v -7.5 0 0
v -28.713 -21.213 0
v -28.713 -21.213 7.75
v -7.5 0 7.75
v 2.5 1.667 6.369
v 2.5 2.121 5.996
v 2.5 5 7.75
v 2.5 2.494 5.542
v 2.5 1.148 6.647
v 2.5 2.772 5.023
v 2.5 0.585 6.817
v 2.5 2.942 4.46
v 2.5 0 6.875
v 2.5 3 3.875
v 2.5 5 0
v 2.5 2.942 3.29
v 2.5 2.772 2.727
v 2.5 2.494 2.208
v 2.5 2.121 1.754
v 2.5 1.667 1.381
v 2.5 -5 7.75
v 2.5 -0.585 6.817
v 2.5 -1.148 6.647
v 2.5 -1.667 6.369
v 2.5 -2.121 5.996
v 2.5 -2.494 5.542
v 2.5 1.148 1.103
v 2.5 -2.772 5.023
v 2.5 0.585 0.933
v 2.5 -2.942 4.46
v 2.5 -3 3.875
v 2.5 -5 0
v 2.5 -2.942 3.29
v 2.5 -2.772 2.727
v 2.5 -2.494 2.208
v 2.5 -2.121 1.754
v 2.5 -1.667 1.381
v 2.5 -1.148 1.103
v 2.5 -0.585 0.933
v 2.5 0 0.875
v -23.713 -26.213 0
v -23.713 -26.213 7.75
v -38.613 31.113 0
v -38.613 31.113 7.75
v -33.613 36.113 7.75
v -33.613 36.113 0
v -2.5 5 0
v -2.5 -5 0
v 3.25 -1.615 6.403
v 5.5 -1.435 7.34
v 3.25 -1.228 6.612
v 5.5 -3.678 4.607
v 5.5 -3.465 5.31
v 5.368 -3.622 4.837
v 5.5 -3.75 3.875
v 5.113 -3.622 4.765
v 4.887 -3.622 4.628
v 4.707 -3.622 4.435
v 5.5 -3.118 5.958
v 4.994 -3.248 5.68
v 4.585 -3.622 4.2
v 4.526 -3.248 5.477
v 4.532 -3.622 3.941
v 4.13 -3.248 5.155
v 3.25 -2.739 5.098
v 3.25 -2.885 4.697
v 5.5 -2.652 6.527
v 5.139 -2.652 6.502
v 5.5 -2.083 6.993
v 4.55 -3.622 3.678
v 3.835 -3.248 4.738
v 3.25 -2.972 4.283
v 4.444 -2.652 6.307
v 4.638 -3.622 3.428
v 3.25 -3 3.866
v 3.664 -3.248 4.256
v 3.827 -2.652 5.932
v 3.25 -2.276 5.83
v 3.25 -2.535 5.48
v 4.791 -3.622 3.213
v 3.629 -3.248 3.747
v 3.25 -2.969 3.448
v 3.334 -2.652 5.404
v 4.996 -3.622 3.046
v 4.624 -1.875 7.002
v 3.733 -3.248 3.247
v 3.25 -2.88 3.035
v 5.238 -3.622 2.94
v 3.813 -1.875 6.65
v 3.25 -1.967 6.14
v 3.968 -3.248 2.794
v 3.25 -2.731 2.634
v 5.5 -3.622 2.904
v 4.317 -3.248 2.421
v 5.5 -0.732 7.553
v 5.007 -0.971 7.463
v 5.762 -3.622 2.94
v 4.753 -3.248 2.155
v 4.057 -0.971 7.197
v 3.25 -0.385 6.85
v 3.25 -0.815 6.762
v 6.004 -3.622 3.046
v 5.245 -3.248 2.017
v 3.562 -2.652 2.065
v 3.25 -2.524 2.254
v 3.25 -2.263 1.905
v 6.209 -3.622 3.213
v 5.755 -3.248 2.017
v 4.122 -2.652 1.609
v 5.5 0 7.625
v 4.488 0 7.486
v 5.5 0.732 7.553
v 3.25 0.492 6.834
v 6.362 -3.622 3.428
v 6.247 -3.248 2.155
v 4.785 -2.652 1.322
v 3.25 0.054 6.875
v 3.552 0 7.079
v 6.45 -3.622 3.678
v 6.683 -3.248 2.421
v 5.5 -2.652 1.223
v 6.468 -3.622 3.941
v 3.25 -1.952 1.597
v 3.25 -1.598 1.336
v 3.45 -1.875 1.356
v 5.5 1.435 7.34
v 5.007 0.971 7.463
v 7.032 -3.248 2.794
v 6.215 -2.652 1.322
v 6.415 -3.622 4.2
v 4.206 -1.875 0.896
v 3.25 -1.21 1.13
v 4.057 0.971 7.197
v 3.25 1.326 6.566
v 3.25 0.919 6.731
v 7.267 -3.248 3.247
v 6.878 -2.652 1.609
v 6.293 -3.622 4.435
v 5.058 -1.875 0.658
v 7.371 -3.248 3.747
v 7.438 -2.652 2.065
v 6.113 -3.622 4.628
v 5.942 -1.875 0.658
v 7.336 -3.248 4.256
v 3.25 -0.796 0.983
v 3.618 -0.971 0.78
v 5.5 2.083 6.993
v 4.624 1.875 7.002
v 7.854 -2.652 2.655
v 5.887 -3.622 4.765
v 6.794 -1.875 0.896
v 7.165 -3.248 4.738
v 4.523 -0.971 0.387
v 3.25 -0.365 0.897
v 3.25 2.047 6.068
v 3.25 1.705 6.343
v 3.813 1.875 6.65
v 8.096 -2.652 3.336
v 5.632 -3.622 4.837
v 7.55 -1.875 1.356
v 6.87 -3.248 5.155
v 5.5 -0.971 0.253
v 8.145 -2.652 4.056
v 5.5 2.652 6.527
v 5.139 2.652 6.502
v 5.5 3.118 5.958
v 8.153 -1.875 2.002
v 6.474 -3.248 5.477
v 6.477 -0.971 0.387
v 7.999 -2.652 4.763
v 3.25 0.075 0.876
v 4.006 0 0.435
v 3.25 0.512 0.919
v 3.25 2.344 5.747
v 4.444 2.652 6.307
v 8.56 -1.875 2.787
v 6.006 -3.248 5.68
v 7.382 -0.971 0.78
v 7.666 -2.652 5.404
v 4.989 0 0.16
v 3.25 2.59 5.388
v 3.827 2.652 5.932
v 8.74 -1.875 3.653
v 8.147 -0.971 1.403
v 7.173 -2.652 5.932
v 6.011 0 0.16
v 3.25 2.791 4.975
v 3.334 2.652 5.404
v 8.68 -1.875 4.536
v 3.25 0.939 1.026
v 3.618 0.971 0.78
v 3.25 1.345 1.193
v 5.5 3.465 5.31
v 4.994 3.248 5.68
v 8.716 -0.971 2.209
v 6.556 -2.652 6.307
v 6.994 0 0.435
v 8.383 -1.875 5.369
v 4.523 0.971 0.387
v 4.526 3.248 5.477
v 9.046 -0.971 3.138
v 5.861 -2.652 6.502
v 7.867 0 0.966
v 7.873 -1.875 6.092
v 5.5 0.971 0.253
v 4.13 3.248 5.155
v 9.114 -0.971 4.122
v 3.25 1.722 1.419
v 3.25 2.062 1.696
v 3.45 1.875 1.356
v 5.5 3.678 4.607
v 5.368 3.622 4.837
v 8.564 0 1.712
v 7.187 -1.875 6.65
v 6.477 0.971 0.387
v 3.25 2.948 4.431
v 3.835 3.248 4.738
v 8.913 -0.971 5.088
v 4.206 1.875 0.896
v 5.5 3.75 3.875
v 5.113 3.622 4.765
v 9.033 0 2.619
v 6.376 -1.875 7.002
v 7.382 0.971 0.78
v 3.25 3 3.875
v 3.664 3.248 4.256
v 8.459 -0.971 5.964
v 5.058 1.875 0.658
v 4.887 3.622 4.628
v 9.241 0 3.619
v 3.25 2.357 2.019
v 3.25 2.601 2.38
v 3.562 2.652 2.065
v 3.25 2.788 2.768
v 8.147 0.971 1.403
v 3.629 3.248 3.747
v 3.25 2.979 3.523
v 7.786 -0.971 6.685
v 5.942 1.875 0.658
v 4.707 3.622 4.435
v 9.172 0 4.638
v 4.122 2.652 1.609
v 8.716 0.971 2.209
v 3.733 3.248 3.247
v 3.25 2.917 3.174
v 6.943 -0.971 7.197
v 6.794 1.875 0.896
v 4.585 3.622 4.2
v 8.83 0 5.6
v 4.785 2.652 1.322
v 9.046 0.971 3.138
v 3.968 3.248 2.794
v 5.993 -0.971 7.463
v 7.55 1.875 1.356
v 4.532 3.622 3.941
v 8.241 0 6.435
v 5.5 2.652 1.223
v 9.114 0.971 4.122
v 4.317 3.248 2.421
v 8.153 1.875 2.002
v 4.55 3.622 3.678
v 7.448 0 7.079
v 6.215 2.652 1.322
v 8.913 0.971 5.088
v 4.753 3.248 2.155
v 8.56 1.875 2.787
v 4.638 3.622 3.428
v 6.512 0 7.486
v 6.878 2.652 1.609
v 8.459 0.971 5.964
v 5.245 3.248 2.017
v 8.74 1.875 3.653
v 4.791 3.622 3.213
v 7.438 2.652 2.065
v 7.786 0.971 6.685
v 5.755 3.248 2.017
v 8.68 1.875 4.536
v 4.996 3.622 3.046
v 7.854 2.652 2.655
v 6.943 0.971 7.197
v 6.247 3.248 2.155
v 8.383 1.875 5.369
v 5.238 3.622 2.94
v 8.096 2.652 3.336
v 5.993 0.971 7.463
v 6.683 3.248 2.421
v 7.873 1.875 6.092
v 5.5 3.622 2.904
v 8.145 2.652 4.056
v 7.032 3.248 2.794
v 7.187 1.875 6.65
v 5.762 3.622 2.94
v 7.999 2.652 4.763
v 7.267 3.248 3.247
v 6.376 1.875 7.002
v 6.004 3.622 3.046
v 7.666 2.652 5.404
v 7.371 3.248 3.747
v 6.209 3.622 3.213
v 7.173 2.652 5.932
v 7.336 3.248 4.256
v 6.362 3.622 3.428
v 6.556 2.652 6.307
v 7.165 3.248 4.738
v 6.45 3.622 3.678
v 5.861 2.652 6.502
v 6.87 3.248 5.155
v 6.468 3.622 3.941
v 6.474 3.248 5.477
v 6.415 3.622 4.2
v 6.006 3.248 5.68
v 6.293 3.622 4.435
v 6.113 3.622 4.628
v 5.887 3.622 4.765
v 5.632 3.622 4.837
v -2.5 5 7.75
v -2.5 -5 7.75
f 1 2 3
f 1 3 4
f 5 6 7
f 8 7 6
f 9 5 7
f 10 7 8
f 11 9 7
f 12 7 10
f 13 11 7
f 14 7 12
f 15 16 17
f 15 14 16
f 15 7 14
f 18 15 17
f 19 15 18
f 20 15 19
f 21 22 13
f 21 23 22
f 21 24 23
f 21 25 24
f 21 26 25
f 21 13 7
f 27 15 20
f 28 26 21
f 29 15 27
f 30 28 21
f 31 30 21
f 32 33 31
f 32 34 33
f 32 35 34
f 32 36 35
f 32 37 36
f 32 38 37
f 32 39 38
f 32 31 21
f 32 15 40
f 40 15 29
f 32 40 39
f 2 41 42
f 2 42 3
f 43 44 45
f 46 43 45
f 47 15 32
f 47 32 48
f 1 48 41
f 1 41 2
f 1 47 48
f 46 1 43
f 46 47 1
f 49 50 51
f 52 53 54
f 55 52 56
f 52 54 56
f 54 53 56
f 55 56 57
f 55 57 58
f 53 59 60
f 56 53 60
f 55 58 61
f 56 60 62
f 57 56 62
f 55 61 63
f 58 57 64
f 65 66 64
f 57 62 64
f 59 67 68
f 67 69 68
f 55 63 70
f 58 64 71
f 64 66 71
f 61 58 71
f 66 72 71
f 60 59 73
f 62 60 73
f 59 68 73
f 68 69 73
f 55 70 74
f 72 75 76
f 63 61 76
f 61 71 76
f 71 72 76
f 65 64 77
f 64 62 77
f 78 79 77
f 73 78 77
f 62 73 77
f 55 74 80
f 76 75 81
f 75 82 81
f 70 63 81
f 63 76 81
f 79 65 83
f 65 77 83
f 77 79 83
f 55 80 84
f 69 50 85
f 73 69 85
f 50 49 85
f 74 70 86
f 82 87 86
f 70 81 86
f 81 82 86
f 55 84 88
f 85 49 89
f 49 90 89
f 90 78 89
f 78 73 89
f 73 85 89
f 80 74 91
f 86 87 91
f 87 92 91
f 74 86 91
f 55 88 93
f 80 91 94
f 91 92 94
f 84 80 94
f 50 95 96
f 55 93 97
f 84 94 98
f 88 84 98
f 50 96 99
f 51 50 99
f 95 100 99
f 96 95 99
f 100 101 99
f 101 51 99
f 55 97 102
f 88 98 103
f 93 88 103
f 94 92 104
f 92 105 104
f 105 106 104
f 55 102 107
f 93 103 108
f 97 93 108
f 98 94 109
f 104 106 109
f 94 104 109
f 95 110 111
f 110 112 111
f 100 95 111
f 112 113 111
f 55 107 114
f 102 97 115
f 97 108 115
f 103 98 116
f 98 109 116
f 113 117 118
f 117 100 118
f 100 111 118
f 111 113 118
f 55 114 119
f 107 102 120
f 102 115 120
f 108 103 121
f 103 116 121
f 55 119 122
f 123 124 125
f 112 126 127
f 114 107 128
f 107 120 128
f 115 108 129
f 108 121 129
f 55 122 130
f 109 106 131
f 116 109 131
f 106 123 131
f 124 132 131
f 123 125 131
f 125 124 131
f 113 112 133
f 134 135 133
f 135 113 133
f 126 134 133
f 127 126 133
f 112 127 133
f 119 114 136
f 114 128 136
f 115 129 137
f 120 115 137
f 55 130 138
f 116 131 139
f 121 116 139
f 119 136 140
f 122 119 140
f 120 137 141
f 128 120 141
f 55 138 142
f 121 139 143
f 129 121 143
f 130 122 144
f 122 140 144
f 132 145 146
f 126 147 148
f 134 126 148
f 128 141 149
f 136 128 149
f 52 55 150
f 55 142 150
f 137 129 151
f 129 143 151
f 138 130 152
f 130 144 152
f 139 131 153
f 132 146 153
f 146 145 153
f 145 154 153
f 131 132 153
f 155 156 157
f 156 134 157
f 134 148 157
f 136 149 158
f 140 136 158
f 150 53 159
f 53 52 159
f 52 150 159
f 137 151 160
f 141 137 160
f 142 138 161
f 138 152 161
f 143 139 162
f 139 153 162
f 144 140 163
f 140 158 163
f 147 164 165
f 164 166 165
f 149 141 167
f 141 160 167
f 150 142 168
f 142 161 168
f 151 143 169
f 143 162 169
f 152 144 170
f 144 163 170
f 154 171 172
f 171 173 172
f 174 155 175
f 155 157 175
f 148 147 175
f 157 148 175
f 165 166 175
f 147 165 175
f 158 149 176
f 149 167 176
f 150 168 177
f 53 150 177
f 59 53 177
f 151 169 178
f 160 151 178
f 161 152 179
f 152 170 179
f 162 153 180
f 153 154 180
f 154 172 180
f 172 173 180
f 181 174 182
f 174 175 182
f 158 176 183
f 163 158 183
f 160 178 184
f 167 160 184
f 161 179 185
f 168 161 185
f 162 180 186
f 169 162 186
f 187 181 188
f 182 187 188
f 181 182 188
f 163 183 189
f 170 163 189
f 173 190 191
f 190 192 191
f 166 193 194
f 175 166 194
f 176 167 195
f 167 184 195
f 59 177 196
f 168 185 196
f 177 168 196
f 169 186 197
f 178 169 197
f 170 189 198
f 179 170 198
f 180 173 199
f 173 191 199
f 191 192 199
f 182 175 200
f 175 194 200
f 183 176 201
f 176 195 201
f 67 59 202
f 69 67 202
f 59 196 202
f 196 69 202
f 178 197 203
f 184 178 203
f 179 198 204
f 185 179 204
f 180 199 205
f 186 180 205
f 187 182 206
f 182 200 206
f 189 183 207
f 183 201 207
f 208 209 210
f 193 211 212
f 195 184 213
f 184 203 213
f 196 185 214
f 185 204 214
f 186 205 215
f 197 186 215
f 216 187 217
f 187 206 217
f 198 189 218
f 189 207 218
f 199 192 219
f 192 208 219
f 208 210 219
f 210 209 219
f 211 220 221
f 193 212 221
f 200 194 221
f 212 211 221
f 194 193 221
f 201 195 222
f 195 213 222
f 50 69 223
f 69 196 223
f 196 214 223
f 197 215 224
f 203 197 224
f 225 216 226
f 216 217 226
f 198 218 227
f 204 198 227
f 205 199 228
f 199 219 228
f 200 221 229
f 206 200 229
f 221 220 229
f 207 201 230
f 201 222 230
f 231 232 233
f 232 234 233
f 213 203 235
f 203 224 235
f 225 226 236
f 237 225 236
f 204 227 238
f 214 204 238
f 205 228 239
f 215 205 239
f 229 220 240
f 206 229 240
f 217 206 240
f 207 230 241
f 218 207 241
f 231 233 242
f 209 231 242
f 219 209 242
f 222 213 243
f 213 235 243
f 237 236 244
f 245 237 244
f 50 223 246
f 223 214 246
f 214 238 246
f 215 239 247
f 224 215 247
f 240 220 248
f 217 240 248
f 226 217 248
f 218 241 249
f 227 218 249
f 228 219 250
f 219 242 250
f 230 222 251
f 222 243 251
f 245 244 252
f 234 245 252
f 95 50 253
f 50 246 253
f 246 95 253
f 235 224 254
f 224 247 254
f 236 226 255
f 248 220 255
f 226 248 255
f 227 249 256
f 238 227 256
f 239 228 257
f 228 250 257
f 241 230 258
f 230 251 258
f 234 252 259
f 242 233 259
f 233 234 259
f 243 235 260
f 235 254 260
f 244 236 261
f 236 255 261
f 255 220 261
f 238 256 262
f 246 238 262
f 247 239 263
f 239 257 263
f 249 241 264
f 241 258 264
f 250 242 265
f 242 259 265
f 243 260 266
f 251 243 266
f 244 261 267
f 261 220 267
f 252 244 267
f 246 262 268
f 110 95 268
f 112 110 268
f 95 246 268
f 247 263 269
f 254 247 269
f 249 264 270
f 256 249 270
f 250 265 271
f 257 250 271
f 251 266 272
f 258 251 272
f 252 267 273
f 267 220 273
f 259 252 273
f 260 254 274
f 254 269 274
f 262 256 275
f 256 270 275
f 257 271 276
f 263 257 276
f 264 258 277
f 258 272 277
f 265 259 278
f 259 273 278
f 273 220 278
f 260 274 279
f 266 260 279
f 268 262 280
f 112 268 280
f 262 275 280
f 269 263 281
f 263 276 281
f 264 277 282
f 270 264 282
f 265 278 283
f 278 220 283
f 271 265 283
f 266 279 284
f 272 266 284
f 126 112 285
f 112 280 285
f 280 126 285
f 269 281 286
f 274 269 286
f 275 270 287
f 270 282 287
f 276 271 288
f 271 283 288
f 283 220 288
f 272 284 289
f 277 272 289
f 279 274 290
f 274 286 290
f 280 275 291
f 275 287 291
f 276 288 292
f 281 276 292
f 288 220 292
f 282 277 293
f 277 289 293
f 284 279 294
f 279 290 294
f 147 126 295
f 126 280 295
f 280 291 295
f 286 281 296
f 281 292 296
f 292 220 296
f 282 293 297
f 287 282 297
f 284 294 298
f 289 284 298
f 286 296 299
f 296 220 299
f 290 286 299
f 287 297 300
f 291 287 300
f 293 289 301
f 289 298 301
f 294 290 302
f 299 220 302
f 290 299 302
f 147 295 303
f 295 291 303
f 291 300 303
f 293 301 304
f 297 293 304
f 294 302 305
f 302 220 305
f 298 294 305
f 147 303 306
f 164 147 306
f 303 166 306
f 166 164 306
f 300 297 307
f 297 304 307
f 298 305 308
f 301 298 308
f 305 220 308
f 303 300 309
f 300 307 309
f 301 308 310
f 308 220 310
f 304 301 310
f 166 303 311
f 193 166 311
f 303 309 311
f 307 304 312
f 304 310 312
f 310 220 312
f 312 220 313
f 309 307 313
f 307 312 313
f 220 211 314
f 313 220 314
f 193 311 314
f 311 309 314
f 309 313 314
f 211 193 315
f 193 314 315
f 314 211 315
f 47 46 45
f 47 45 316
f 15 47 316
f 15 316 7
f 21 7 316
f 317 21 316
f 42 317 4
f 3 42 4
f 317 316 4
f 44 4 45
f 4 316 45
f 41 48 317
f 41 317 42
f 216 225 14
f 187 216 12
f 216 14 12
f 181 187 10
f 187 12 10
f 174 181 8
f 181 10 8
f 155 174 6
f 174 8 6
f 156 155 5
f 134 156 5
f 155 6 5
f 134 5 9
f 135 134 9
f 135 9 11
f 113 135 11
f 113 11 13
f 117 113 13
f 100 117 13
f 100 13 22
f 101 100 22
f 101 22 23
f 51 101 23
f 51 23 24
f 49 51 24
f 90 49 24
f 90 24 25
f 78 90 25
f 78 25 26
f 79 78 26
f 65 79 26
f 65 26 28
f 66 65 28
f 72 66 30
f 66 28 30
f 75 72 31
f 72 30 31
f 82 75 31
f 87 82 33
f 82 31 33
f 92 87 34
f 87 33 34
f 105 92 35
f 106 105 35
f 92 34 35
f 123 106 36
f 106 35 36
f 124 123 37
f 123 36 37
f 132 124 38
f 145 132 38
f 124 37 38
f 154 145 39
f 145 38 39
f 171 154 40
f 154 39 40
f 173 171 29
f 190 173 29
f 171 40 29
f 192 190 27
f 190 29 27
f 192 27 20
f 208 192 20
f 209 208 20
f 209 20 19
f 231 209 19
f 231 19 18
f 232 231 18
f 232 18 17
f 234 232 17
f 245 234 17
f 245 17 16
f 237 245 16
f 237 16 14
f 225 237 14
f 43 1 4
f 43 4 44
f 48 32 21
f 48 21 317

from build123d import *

# Parameters (mm, degrees)
BOSS_EXTRUDE3_DEPTH = 7.75
SKETCH4_R           = 3
BOSS_EXTRUDE4_DEPTH = 3


with BuildPart() as part:
    # Sketch3 → Boss-Extrude3 (new body)
    with BuildSketch(Plane.XY):
        Polygon((-2.5, 5), (2.5, 5), (2.5, -5), (-2.5, -5), (-23.713203436, -26.213203436), (-28.713203436, -21.213203436), (-7.5, 0), (-38.612698372, 31.112698372), (-33.612698372, 36.112698372), align=None)
    extrude(amount=BOSS_EXTRUDE3_DEPTH)

    # Sketch4 → Boss-Extrude4 (add)
    with BuildSketch(Plane(origin=(2.5, 0, 0), x_dir=(0, 0, -1), z_dir=(1, 0, 0))):
        with Locations(Location((-3.875, 0, 0), (0, 0, 90))):
            Circle(SKETCH4_R)
    extrude(amount=BOSS_EXTRUDE4_DEPTH)

    # Sketch5 → Revolve1 (revolve)
    with BuildSketch(Plane(origin=(5.5, 0, 0), x_dir=(0, 0, -1), z_dir=(1, 0, 0))):
        with BuildLine():
            Line((-3.875, 3.75), (-3.875, -3.75))
            ThreePointArc((-3.875, -3.75), (-7.625, 0), (-3.875, 3.75))
        make_face()
    revolve(axis=Axis((5.5, 4.135747614, 3.875), (0, -1, 0)))


solid = part.part
